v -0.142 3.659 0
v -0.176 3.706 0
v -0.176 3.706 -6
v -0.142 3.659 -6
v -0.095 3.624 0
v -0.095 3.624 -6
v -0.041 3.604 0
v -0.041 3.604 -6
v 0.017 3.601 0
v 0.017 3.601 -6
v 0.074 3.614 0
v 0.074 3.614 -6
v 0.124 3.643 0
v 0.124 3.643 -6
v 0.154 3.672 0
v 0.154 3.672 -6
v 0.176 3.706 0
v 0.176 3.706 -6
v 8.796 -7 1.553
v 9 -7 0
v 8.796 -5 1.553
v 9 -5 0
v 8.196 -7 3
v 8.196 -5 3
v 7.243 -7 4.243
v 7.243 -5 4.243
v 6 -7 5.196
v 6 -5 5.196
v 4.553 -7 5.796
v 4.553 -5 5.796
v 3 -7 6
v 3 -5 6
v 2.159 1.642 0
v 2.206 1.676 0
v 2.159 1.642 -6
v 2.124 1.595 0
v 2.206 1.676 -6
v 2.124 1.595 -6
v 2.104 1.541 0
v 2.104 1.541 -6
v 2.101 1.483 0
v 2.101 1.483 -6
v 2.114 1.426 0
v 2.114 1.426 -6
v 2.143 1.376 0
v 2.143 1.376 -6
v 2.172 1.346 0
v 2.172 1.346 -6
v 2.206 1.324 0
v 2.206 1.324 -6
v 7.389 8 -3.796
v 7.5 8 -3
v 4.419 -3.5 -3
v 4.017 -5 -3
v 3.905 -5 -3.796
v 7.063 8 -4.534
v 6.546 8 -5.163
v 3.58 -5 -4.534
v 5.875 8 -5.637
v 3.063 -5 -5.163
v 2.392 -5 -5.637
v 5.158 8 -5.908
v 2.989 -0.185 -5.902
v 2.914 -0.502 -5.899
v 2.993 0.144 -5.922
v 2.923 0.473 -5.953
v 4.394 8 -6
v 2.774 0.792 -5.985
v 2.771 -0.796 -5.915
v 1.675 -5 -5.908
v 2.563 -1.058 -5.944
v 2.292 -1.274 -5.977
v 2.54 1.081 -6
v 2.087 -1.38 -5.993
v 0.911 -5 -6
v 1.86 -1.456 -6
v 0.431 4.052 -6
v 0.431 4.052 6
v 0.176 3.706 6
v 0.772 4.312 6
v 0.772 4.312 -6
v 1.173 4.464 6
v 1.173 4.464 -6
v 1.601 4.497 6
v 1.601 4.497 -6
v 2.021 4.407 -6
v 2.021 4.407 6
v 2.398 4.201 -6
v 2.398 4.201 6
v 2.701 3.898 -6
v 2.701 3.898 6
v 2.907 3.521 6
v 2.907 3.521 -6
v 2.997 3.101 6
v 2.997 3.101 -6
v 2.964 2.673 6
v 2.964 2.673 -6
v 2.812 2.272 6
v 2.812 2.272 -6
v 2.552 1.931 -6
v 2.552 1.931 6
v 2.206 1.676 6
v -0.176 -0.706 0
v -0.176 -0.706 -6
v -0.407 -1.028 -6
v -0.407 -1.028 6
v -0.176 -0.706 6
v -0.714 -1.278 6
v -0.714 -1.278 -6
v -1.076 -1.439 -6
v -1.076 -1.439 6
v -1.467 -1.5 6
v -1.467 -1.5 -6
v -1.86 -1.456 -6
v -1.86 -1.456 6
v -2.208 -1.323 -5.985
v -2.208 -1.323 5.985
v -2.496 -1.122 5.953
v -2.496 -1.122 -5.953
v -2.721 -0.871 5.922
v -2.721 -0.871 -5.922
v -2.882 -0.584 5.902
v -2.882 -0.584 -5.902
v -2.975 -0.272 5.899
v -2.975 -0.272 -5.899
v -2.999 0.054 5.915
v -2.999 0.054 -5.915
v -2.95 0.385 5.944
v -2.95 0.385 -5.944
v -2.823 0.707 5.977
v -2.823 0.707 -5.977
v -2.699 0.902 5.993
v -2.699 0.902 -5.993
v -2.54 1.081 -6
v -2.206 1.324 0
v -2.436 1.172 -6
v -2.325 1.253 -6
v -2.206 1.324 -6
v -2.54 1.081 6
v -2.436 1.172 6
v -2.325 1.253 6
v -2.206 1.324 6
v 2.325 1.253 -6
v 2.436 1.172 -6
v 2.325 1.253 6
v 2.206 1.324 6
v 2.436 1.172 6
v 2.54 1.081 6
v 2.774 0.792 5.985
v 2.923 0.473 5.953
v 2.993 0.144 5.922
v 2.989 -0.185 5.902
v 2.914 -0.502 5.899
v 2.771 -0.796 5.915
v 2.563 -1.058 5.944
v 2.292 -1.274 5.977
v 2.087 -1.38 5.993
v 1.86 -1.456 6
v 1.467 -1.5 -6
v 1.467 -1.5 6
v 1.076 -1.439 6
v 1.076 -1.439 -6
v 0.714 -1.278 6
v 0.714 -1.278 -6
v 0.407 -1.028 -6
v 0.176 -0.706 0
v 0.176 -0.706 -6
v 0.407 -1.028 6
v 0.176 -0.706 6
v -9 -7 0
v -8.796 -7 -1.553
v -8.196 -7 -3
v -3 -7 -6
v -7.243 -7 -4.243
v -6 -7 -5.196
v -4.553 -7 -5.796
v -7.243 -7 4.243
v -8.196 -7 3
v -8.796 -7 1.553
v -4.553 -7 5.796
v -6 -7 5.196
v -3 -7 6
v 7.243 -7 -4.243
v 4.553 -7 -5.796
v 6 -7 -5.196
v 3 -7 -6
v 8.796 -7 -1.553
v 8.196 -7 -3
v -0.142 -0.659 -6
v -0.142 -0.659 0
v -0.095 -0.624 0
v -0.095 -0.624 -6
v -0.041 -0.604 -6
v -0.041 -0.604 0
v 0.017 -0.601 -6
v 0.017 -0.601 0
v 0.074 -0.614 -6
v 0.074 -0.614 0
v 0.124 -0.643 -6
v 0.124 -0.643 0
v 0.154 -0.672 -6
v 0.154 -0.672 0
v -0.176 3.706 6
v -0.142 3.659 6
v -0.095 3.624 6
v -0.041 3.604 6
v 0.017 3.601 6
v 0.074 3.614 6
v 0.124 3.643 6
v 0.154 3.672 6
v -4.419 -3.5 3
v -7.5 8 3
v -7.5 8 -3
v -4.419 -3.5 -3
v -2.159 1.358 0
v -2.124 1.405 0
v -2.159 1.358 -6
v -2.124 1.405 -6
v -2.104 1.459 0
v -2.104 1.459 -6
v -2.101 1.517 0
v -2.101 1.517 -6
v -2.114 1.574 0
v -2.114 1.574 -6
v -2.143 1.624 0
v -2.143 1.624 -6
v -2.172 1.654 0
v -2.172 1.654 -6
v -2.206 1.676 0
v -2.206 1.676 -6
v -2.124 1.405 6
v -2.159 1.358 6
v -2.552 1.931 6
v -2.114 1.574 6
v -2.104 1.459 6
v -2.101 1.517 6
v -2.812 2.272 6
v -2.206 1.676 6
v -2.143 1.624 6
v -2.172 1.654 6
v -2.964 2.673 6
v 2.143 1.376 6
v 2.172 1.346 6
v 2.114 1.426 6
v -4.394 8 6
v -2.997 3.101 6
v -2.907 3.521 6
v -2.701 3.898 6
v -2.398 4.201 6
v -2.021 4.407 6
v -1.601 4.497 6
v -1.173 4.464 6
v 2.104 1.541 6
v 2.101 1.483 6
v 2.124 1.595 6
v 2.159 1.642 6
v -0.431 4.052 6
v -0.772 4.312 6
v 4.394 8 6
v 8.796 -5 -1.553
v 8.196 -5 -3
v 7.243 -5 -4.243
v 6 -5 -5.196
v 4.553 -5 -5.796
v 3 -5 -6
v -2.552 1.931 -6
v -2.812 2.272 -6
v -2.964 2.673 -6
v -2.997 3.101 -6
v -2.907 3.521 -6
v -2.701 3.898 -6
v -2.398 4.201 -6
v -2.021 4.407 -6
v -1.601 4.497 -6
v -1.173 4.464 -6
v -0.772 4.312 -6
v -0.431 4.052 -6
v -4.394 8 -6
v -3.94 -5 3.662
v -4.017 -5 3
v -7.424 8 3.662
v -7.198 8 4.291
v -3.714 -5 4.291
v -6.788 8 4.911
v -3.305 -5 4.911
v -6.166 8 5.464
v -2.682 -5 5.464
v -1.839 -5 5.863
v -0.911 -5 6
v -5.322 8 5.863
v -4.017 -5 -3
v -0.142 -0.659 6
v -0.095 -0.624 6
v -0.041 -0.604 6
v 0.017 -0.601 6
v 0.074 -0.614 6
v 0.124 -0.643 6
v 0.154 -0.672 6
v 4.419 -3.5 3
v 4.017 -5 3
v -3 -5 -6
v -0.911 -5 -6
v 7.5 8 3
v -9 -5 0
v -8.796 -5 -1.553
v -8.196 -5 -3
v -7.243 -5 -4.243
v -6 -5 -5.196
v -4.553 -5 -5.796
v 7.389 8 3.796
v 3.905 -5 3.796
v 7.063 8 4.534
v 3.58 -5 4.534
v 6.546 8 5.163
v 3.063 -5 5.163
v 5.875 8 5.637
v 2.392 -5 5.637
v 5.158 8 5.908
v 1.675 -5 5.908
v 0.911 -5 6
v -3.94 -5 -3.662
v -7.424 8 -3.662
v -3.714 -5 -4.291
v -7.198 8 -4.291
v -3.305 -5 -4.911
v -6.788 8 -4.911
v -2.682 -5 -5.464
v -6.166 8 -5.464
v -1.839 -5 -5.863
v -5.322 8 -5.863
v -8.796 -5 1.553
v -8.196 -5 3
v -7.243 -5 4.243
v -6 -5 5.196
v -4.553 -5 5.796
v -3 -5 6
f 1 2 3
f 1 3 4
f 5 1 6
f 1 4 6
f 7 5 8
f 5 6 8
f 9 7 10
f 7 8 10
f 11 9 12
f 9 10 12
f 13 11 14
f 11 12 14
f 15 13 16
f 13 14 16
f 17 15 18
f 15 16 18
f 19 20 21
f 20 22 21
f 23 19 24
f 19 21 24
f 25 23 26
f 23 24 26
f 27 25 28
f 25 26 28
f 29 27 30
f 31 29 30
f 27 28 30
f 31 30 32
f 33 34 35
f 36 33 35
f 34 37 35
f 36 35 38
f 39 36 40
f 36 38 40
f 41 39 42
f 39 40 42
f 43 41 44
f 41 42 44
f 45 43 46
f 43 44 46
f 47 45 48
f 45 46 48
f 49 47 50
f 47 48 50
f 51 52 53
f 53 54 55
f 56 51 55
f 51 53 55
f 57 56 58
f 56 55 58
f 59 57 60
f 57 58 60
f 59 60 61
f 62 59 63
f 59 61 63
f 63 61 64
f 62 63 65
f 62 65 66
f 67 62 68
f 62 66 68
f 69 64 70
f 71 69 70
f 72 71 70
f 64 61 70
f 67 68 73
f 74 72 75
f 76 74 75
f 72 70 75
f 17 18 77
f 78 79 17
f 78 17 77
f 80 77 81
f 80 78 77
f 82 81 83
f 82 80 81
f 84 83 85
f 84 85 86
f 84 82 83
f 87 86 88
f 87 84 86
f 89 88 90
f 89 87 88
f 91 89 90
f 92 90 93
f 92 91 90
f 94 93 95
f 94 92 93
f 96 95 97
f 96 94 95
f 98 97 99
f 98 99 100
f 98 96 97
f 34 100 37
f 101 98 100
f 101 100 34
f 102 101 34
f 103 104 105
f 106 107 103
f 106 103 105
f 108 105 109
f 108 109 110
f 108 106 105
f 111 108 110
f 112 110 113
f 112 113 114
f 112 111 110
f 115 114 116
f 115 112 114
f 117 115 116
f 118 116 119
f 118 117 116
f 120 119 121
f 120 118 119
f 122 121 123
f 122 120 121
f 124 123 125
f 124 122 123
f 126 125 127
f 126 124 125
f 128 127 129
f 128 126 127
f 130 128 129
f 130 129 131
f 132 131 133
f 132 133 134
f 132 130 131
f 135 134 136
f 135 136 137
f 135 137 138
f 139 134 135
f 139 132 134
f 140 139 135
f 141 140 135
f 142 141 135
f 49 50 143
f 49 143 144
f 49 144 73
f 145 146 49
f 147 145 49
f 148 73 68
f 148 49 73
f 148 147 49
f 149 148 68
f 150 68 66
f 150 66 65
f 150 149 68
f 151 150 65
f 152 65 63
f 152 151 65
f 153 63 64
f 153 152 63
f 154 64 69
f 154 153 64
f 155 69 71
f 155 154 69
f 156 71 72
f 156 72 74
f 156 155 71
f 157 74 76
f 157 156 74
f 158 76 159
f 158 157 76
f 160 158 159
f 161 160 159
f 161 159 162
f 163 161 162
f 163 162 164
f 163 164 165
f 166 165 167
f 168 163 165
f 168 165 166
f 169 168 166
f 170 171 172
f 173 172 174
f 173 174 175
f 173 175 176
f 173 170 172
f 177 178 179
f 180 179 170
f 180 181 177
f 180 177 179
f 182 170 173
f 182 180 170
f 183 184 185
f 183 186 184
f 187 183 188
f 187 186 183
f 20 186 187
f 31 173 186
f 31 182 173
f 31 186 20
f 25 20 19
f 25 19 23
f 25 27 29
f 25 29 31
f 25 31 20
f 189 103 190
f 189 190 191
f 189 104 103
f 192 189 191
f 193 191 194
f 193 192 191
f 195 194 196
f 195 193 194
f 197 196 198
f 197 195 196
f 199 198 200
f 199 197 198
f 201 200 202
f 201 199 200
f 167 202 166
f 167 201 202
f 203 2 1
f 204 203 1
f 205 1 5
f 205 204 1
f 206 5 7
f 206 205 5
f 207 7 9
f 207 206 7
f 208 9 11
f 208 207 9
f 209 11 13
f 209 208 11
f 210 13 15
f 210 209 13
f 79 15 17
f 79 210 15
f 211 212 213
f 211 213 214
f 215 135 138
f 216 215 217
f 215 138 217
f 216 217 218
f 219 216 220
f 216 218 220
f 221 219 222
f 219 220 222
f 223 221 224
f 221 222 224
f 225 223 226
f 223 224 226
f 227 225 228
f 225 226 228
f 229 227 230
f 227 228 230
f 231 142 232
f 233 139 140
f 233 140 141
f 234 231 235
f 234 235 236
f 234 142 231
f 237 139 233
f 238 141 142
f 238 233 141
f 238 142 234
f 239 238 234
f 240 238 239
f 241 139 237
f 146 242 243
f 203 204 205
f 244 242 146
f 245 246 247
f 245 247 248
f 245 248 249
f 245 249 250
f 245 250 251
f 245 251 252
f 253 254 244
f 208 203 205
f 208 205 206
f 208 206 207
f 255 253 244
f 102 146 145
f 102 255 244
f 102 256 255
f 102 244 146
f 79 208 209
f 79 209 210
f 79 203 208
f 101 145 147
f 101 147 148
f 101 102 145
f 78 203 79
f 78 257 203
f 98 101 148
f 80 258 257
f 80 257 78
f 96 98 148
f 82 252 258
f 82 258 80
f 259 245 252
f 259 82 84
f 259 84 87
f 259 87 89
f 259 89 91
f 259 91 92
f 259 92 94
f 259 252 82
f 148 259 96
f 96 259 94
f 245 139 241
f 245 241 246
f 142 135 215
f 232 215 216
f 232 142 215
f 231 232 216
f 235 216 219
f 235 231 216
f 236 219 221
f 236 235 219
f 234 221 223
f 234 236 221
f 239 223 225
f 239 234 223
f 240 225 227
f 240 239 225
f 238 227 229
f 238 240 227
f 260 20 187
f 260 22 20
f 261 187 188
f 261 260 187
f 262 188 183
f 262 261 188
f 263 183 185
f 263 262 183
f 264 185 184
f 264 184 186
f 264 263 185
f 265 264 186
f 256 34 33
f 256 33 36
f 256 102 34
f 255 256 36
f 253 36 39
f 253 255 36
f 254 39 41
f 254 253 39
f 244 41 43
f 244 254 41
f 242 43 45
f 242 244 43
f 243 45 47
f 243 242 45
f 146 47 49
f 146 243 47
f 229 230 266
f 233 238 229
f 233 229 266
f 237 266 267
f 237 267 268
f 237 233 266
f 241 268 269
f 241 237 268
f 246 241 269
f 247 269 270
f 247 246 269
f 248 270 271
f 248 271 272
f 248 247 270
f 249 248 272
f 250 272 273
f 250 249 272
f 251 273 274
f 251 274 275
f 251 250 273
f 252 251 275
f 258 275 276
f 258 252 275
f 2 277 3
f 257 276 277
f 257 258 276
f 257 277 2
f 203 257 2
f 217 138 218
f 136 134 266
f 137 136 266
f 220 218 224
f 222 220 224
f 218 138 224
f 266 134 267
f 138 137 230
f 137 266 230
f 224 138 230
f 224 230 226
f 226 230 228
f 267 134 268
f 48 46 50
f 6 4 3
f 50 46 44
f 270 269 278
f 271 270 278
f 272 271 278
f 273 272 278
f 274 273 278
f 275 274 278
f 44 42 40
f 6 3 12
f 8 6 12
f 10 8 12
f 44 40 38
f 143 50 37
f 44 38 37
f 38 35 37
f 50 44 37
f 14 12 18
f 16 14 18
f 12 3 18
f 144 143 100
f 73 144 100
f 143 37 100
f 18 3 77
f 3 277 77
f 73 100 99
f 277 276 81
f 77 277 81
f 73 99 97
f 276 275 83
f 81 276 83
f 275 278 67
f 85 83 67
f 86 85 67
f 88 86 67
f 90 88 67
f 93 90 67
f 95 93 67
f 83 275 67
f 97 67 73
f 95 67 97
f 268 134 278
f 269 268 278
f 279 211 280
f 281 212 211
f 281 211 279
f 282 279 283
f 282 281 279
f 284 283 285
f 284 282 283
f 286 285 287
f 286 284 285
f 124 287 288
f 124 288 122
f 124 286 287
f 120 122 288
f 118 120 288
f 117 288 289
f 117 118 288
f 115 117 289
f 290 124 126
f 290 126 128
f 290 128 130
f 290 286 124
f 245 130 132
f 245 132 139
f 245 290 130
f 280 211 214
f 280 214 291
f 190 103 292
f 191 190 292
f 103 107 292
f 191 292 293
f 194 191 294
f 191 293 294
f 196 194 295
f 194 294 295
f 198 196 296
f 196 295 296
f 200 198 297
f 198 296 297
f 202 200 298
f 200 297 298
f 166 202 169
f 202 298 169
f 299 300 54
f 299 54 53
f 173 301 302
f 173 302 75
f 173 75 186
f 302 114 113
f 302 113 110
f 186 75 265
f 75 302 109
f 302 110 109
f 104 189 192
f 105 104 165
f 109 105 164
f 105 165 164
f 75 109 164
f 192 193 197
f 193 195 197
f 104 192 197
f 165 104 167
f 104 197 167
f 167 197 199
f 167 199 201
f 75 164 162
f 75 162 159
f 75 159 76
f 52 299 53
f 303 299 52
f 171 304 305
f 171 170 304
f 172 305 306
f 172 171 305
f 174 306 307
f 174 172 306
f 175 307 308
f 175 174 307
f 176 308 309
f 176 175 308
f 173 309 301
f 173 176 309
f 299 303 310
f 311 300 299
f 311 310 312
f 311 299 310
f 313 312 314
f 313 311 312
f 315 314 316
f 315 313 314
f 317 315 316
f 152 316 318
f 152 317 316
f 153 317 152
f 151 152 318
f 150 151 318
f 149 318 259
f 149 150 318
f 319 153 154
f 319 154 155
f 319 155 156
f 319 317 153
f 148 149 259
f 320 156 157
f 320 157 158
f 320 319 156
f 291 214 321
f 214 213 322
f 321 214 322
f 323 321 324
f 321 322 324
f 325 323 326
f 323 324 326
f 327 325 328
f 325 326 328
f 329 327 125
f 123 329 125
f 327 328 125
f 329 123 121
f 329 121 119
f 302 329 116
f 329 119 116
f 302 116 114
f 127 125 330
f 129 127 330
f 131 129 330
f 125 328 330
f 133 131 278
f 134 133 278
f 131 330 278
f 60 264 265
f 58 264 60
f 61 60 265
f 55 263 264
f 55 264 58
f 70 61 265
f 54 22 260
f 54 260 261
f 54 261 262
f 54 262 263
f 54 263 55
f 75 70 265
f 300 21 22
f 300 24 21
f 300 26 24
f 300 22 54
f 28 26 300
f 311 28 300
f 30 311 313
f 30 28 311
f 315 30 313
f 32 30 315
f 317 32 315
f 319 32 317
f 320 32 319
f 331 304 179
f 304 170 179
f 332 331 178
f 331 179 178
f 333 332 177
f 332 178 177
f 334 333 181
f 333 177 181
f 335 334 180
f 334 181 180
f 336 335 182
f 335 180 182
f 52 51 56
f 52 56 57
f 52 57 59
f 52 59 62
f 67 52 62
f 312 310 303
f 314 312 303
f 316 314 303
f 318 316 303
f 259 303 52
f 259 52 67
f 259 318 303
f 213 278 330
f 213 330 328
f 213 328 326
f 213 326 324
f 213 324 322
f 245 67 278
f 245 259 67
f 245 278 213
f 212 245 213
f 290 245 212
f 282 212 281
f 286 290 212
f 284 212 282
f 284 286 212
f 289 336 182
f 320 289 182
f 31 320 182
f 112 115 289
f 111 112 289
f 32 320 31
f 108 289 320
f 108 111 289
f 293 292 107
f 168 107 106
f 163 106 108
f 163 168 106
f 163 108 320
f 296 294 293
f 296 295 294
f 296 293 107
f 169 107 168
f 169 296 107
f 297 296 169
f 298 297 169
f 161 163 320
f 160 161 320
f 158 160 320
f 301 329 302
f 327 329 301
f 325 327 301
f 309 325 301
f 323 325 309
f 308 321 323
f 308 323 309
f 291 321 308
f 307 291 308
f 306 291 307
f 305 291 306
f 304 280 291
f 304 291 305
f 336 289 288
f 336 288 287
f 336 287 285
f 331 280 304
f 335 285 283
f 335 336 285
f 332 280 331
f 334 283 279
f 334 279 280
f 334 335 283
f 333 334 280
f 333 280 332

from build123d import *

# Parameters (mm, degrees)
F1_DEPTH    = 6
F2_F1_R     = 0.2
F2_F2_R     = 0.2
F3_T4_DEPTH = 28.4585903453
F3_T9_DEPTH = 28.4585903453
F4_R        = 5.99999


# Not quite as in the source:
# - a fillet or chamfer that OpenCascade refuses, or shapes differently, is made with other operations: its cross-section is extruded or revolved along the edge and cut away or added
# - a fillet or chamfer is up to 0.001 mm smaller than in the source, because OpenCascade refuses the exact size


with BuildPart() as f1:
    # F0 (on Top) → F1 (new body)
    with BuildSketch(Plane.XY):
        Polygon((-7.5, 8), (-4.418584287, -3.5), (4.418584287, -3.5), (7.5, 8), align=None)
        with BuildLine():
            ThreePointArc((-1.5, 1.5), (-2.5606601718, 4.0606601718), (0, 3))
            ThreePointArc((0, 3), (2.5606601718, 4.0606601718), (1.5, 1.5))
            ThreePointArc((1.5, 1.5), (2.5606601718, -1.0606601718), (0, 0))
            ThreePointArc((0, 0), (-2.5606601718, -1.0606601718), (-1.5, 1.5))
        make_face(mode=Mode.SUBTRACT)
        Polygon((-9, -5), (-9, -7), (9, -7), (9, -5), (4.0166604984, -5), (-4.0166604984, -5), align=None)
        Polygon((-4.418584287, -3.5), (-4.0166604984, -5), (4.0166604984, -5), (4.418584287, -3.5), align=None)
    extrude(amount=F1_DEPTH)

    # F2: fillet of radius 0.2 on 4 edges, made by hand

    # F2_f1
    f2_f1_edges = [f1.edges().sort_by_distance(p)[0] for p in [
        (-1.5, 1.5, 3),
        (0, 3, 3),
        (1.5, 1.5, 3),
    ]]
    fillet(f2_f1_edges, radius=F2_F1_R)

    # F2_f2
    f2_f2_edges = [f1.edges().sort_by_distance(p)[0] for p in [
        (0, 0, 3),
    ]]
    fillet(f2_f2_edges, radius=F2_F2_R)

    # F3: fillet of radius 3 on 2 edges, made by hand


with BuildPart() as f3_tool2:
    # F3_s3 → F3_t4 (new body)
    with BuildSketch(Plane(origin=(-4.4435475741, 16.5835453123, 0), x_dir=(0, 0, 1), z_dir=(0.2588190451, -0.9659258263, 0))):
        with BuildLine():
            ThreePointArc((3, 5.1738913363), (5.1213203436, 4.2952116799), (6, 2.1738913363))
            Line((6, 2.1738913363), (6, 5.1738913363))
            Line((6, 5.1738913363), (3, 5.1738913363))
        make_face()
    extrude(amount=F3_T4_DEPTH)

    split(bisect_by=Plane.XZ.offset(5), keep=Keep.BOTTOM)


with BuildPart() as f1_1:
    add(f1.part)

    # F3_t1: cut F3_tool2
    add(f3_tool2.part, mode=Mode.SUBTRACT)


with BuildPart() as f3_tool7:
    # F3_s8 → F3_t9 (new body)
    with BuildSketch(Plane(origin=(-2.9220776041, -10.905342082, 0), x_dir=(0, 0, 1), z_dir=(0.2588190451, 0.9659258263, 0))):
        with BuildLine():
            ThreePointArc((3, 5.1738913363), (5.1213203436, 4.2952116799), (6, 2.1738913363))
            Line((6, 2.1738913363), (6, 5.1738913363))
            Line((6, 5.1738913363), (3, 5.1738913363))
        make_face()
    extrude(amount=F3_T9_DEPTH)

    split(bisect_by=Plane.XZ.offset(5), keep=Keep.BOTTOM)


with BuildPart() as f1_2:
    add(f1_1.part)

    # F3_t6: cut F3_tool7
    add(f3_tool7.part, mode=Mode.SUBTRACT)

    # F4 (radius 6 in the source; OpenCascade refuses exactly that, so slightly less here)
    f4_edges = [f1_2.edges().sort_by_distance(p)[0] for p in [
        (9, -6, 6),
        (-9, -6, 6),
    ]]
    fillet(f4_edges, radius=F4_R)

    # F5: F1 across plane


with BuildPart() as f1_3:
    add(f1_2.part)
    add(f1_2.part.mirror(Plane.XY))


solid = f1_3.part
